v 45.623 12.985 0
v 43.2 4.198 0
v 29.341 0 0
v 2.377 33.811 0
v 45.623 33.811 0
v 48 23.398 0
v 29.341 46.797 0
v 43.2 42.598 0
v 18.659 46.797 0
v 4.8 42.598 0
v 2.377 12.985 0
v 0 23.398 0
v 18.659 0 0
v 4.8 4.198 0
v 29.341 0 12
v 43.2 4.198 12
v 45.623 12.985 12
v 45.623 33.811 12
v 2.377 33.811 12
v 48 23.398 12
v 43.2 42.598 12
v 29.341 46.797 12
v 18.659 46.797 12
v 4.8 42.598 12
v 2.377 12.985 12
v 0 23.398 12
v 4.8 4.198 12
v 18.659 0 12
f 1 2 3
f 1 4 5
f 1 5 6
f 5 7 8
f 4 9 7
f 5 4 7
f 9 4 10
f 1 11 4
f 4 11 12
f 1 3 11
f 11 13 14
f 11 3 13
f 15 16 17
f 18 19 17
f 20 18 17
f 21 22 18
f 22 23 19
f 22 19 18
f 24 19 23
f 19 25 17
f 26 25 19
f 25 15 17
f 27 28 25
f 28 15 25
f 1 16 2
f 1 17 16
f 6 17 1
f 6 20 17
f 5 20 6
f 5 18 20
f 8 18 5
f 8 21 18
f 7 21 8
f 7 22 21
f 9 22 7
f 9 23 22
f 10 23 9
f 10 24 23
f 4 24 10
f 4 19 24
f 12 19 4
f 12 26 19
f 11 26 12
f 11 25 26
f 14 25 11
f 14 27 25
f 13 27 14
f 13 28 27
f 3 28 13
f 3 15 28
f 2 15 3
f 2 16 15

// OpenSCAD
$fn = 32;

// ----------------------------------------------------------------------
// Flat adaptor: hex_disc, 12 mm thick
// ----------------------------------------------------------------------

// --- parameters (mm) ---
profile_height = 12;      // extrusion height
profile_points = 14;      // points of the closed outline

profile = [[0, 23.398], [2.377, 12.985], [4.8, 4.198], [18.659, 0], [29.341, 0], [43.2, 4.198], [45.623, 12.985], [48, 23.398], [45.623, 33.811], [43.2, 42.598], [29.341, 46.797], [18.659, 46.797], [4.8, 42.598], [2.377, 33.811]];  // single closed polygon, 14 points, counter clockwise

// --- the one profile operation ---
linear_extrude(height = profile_height) polygon(points = profile);
